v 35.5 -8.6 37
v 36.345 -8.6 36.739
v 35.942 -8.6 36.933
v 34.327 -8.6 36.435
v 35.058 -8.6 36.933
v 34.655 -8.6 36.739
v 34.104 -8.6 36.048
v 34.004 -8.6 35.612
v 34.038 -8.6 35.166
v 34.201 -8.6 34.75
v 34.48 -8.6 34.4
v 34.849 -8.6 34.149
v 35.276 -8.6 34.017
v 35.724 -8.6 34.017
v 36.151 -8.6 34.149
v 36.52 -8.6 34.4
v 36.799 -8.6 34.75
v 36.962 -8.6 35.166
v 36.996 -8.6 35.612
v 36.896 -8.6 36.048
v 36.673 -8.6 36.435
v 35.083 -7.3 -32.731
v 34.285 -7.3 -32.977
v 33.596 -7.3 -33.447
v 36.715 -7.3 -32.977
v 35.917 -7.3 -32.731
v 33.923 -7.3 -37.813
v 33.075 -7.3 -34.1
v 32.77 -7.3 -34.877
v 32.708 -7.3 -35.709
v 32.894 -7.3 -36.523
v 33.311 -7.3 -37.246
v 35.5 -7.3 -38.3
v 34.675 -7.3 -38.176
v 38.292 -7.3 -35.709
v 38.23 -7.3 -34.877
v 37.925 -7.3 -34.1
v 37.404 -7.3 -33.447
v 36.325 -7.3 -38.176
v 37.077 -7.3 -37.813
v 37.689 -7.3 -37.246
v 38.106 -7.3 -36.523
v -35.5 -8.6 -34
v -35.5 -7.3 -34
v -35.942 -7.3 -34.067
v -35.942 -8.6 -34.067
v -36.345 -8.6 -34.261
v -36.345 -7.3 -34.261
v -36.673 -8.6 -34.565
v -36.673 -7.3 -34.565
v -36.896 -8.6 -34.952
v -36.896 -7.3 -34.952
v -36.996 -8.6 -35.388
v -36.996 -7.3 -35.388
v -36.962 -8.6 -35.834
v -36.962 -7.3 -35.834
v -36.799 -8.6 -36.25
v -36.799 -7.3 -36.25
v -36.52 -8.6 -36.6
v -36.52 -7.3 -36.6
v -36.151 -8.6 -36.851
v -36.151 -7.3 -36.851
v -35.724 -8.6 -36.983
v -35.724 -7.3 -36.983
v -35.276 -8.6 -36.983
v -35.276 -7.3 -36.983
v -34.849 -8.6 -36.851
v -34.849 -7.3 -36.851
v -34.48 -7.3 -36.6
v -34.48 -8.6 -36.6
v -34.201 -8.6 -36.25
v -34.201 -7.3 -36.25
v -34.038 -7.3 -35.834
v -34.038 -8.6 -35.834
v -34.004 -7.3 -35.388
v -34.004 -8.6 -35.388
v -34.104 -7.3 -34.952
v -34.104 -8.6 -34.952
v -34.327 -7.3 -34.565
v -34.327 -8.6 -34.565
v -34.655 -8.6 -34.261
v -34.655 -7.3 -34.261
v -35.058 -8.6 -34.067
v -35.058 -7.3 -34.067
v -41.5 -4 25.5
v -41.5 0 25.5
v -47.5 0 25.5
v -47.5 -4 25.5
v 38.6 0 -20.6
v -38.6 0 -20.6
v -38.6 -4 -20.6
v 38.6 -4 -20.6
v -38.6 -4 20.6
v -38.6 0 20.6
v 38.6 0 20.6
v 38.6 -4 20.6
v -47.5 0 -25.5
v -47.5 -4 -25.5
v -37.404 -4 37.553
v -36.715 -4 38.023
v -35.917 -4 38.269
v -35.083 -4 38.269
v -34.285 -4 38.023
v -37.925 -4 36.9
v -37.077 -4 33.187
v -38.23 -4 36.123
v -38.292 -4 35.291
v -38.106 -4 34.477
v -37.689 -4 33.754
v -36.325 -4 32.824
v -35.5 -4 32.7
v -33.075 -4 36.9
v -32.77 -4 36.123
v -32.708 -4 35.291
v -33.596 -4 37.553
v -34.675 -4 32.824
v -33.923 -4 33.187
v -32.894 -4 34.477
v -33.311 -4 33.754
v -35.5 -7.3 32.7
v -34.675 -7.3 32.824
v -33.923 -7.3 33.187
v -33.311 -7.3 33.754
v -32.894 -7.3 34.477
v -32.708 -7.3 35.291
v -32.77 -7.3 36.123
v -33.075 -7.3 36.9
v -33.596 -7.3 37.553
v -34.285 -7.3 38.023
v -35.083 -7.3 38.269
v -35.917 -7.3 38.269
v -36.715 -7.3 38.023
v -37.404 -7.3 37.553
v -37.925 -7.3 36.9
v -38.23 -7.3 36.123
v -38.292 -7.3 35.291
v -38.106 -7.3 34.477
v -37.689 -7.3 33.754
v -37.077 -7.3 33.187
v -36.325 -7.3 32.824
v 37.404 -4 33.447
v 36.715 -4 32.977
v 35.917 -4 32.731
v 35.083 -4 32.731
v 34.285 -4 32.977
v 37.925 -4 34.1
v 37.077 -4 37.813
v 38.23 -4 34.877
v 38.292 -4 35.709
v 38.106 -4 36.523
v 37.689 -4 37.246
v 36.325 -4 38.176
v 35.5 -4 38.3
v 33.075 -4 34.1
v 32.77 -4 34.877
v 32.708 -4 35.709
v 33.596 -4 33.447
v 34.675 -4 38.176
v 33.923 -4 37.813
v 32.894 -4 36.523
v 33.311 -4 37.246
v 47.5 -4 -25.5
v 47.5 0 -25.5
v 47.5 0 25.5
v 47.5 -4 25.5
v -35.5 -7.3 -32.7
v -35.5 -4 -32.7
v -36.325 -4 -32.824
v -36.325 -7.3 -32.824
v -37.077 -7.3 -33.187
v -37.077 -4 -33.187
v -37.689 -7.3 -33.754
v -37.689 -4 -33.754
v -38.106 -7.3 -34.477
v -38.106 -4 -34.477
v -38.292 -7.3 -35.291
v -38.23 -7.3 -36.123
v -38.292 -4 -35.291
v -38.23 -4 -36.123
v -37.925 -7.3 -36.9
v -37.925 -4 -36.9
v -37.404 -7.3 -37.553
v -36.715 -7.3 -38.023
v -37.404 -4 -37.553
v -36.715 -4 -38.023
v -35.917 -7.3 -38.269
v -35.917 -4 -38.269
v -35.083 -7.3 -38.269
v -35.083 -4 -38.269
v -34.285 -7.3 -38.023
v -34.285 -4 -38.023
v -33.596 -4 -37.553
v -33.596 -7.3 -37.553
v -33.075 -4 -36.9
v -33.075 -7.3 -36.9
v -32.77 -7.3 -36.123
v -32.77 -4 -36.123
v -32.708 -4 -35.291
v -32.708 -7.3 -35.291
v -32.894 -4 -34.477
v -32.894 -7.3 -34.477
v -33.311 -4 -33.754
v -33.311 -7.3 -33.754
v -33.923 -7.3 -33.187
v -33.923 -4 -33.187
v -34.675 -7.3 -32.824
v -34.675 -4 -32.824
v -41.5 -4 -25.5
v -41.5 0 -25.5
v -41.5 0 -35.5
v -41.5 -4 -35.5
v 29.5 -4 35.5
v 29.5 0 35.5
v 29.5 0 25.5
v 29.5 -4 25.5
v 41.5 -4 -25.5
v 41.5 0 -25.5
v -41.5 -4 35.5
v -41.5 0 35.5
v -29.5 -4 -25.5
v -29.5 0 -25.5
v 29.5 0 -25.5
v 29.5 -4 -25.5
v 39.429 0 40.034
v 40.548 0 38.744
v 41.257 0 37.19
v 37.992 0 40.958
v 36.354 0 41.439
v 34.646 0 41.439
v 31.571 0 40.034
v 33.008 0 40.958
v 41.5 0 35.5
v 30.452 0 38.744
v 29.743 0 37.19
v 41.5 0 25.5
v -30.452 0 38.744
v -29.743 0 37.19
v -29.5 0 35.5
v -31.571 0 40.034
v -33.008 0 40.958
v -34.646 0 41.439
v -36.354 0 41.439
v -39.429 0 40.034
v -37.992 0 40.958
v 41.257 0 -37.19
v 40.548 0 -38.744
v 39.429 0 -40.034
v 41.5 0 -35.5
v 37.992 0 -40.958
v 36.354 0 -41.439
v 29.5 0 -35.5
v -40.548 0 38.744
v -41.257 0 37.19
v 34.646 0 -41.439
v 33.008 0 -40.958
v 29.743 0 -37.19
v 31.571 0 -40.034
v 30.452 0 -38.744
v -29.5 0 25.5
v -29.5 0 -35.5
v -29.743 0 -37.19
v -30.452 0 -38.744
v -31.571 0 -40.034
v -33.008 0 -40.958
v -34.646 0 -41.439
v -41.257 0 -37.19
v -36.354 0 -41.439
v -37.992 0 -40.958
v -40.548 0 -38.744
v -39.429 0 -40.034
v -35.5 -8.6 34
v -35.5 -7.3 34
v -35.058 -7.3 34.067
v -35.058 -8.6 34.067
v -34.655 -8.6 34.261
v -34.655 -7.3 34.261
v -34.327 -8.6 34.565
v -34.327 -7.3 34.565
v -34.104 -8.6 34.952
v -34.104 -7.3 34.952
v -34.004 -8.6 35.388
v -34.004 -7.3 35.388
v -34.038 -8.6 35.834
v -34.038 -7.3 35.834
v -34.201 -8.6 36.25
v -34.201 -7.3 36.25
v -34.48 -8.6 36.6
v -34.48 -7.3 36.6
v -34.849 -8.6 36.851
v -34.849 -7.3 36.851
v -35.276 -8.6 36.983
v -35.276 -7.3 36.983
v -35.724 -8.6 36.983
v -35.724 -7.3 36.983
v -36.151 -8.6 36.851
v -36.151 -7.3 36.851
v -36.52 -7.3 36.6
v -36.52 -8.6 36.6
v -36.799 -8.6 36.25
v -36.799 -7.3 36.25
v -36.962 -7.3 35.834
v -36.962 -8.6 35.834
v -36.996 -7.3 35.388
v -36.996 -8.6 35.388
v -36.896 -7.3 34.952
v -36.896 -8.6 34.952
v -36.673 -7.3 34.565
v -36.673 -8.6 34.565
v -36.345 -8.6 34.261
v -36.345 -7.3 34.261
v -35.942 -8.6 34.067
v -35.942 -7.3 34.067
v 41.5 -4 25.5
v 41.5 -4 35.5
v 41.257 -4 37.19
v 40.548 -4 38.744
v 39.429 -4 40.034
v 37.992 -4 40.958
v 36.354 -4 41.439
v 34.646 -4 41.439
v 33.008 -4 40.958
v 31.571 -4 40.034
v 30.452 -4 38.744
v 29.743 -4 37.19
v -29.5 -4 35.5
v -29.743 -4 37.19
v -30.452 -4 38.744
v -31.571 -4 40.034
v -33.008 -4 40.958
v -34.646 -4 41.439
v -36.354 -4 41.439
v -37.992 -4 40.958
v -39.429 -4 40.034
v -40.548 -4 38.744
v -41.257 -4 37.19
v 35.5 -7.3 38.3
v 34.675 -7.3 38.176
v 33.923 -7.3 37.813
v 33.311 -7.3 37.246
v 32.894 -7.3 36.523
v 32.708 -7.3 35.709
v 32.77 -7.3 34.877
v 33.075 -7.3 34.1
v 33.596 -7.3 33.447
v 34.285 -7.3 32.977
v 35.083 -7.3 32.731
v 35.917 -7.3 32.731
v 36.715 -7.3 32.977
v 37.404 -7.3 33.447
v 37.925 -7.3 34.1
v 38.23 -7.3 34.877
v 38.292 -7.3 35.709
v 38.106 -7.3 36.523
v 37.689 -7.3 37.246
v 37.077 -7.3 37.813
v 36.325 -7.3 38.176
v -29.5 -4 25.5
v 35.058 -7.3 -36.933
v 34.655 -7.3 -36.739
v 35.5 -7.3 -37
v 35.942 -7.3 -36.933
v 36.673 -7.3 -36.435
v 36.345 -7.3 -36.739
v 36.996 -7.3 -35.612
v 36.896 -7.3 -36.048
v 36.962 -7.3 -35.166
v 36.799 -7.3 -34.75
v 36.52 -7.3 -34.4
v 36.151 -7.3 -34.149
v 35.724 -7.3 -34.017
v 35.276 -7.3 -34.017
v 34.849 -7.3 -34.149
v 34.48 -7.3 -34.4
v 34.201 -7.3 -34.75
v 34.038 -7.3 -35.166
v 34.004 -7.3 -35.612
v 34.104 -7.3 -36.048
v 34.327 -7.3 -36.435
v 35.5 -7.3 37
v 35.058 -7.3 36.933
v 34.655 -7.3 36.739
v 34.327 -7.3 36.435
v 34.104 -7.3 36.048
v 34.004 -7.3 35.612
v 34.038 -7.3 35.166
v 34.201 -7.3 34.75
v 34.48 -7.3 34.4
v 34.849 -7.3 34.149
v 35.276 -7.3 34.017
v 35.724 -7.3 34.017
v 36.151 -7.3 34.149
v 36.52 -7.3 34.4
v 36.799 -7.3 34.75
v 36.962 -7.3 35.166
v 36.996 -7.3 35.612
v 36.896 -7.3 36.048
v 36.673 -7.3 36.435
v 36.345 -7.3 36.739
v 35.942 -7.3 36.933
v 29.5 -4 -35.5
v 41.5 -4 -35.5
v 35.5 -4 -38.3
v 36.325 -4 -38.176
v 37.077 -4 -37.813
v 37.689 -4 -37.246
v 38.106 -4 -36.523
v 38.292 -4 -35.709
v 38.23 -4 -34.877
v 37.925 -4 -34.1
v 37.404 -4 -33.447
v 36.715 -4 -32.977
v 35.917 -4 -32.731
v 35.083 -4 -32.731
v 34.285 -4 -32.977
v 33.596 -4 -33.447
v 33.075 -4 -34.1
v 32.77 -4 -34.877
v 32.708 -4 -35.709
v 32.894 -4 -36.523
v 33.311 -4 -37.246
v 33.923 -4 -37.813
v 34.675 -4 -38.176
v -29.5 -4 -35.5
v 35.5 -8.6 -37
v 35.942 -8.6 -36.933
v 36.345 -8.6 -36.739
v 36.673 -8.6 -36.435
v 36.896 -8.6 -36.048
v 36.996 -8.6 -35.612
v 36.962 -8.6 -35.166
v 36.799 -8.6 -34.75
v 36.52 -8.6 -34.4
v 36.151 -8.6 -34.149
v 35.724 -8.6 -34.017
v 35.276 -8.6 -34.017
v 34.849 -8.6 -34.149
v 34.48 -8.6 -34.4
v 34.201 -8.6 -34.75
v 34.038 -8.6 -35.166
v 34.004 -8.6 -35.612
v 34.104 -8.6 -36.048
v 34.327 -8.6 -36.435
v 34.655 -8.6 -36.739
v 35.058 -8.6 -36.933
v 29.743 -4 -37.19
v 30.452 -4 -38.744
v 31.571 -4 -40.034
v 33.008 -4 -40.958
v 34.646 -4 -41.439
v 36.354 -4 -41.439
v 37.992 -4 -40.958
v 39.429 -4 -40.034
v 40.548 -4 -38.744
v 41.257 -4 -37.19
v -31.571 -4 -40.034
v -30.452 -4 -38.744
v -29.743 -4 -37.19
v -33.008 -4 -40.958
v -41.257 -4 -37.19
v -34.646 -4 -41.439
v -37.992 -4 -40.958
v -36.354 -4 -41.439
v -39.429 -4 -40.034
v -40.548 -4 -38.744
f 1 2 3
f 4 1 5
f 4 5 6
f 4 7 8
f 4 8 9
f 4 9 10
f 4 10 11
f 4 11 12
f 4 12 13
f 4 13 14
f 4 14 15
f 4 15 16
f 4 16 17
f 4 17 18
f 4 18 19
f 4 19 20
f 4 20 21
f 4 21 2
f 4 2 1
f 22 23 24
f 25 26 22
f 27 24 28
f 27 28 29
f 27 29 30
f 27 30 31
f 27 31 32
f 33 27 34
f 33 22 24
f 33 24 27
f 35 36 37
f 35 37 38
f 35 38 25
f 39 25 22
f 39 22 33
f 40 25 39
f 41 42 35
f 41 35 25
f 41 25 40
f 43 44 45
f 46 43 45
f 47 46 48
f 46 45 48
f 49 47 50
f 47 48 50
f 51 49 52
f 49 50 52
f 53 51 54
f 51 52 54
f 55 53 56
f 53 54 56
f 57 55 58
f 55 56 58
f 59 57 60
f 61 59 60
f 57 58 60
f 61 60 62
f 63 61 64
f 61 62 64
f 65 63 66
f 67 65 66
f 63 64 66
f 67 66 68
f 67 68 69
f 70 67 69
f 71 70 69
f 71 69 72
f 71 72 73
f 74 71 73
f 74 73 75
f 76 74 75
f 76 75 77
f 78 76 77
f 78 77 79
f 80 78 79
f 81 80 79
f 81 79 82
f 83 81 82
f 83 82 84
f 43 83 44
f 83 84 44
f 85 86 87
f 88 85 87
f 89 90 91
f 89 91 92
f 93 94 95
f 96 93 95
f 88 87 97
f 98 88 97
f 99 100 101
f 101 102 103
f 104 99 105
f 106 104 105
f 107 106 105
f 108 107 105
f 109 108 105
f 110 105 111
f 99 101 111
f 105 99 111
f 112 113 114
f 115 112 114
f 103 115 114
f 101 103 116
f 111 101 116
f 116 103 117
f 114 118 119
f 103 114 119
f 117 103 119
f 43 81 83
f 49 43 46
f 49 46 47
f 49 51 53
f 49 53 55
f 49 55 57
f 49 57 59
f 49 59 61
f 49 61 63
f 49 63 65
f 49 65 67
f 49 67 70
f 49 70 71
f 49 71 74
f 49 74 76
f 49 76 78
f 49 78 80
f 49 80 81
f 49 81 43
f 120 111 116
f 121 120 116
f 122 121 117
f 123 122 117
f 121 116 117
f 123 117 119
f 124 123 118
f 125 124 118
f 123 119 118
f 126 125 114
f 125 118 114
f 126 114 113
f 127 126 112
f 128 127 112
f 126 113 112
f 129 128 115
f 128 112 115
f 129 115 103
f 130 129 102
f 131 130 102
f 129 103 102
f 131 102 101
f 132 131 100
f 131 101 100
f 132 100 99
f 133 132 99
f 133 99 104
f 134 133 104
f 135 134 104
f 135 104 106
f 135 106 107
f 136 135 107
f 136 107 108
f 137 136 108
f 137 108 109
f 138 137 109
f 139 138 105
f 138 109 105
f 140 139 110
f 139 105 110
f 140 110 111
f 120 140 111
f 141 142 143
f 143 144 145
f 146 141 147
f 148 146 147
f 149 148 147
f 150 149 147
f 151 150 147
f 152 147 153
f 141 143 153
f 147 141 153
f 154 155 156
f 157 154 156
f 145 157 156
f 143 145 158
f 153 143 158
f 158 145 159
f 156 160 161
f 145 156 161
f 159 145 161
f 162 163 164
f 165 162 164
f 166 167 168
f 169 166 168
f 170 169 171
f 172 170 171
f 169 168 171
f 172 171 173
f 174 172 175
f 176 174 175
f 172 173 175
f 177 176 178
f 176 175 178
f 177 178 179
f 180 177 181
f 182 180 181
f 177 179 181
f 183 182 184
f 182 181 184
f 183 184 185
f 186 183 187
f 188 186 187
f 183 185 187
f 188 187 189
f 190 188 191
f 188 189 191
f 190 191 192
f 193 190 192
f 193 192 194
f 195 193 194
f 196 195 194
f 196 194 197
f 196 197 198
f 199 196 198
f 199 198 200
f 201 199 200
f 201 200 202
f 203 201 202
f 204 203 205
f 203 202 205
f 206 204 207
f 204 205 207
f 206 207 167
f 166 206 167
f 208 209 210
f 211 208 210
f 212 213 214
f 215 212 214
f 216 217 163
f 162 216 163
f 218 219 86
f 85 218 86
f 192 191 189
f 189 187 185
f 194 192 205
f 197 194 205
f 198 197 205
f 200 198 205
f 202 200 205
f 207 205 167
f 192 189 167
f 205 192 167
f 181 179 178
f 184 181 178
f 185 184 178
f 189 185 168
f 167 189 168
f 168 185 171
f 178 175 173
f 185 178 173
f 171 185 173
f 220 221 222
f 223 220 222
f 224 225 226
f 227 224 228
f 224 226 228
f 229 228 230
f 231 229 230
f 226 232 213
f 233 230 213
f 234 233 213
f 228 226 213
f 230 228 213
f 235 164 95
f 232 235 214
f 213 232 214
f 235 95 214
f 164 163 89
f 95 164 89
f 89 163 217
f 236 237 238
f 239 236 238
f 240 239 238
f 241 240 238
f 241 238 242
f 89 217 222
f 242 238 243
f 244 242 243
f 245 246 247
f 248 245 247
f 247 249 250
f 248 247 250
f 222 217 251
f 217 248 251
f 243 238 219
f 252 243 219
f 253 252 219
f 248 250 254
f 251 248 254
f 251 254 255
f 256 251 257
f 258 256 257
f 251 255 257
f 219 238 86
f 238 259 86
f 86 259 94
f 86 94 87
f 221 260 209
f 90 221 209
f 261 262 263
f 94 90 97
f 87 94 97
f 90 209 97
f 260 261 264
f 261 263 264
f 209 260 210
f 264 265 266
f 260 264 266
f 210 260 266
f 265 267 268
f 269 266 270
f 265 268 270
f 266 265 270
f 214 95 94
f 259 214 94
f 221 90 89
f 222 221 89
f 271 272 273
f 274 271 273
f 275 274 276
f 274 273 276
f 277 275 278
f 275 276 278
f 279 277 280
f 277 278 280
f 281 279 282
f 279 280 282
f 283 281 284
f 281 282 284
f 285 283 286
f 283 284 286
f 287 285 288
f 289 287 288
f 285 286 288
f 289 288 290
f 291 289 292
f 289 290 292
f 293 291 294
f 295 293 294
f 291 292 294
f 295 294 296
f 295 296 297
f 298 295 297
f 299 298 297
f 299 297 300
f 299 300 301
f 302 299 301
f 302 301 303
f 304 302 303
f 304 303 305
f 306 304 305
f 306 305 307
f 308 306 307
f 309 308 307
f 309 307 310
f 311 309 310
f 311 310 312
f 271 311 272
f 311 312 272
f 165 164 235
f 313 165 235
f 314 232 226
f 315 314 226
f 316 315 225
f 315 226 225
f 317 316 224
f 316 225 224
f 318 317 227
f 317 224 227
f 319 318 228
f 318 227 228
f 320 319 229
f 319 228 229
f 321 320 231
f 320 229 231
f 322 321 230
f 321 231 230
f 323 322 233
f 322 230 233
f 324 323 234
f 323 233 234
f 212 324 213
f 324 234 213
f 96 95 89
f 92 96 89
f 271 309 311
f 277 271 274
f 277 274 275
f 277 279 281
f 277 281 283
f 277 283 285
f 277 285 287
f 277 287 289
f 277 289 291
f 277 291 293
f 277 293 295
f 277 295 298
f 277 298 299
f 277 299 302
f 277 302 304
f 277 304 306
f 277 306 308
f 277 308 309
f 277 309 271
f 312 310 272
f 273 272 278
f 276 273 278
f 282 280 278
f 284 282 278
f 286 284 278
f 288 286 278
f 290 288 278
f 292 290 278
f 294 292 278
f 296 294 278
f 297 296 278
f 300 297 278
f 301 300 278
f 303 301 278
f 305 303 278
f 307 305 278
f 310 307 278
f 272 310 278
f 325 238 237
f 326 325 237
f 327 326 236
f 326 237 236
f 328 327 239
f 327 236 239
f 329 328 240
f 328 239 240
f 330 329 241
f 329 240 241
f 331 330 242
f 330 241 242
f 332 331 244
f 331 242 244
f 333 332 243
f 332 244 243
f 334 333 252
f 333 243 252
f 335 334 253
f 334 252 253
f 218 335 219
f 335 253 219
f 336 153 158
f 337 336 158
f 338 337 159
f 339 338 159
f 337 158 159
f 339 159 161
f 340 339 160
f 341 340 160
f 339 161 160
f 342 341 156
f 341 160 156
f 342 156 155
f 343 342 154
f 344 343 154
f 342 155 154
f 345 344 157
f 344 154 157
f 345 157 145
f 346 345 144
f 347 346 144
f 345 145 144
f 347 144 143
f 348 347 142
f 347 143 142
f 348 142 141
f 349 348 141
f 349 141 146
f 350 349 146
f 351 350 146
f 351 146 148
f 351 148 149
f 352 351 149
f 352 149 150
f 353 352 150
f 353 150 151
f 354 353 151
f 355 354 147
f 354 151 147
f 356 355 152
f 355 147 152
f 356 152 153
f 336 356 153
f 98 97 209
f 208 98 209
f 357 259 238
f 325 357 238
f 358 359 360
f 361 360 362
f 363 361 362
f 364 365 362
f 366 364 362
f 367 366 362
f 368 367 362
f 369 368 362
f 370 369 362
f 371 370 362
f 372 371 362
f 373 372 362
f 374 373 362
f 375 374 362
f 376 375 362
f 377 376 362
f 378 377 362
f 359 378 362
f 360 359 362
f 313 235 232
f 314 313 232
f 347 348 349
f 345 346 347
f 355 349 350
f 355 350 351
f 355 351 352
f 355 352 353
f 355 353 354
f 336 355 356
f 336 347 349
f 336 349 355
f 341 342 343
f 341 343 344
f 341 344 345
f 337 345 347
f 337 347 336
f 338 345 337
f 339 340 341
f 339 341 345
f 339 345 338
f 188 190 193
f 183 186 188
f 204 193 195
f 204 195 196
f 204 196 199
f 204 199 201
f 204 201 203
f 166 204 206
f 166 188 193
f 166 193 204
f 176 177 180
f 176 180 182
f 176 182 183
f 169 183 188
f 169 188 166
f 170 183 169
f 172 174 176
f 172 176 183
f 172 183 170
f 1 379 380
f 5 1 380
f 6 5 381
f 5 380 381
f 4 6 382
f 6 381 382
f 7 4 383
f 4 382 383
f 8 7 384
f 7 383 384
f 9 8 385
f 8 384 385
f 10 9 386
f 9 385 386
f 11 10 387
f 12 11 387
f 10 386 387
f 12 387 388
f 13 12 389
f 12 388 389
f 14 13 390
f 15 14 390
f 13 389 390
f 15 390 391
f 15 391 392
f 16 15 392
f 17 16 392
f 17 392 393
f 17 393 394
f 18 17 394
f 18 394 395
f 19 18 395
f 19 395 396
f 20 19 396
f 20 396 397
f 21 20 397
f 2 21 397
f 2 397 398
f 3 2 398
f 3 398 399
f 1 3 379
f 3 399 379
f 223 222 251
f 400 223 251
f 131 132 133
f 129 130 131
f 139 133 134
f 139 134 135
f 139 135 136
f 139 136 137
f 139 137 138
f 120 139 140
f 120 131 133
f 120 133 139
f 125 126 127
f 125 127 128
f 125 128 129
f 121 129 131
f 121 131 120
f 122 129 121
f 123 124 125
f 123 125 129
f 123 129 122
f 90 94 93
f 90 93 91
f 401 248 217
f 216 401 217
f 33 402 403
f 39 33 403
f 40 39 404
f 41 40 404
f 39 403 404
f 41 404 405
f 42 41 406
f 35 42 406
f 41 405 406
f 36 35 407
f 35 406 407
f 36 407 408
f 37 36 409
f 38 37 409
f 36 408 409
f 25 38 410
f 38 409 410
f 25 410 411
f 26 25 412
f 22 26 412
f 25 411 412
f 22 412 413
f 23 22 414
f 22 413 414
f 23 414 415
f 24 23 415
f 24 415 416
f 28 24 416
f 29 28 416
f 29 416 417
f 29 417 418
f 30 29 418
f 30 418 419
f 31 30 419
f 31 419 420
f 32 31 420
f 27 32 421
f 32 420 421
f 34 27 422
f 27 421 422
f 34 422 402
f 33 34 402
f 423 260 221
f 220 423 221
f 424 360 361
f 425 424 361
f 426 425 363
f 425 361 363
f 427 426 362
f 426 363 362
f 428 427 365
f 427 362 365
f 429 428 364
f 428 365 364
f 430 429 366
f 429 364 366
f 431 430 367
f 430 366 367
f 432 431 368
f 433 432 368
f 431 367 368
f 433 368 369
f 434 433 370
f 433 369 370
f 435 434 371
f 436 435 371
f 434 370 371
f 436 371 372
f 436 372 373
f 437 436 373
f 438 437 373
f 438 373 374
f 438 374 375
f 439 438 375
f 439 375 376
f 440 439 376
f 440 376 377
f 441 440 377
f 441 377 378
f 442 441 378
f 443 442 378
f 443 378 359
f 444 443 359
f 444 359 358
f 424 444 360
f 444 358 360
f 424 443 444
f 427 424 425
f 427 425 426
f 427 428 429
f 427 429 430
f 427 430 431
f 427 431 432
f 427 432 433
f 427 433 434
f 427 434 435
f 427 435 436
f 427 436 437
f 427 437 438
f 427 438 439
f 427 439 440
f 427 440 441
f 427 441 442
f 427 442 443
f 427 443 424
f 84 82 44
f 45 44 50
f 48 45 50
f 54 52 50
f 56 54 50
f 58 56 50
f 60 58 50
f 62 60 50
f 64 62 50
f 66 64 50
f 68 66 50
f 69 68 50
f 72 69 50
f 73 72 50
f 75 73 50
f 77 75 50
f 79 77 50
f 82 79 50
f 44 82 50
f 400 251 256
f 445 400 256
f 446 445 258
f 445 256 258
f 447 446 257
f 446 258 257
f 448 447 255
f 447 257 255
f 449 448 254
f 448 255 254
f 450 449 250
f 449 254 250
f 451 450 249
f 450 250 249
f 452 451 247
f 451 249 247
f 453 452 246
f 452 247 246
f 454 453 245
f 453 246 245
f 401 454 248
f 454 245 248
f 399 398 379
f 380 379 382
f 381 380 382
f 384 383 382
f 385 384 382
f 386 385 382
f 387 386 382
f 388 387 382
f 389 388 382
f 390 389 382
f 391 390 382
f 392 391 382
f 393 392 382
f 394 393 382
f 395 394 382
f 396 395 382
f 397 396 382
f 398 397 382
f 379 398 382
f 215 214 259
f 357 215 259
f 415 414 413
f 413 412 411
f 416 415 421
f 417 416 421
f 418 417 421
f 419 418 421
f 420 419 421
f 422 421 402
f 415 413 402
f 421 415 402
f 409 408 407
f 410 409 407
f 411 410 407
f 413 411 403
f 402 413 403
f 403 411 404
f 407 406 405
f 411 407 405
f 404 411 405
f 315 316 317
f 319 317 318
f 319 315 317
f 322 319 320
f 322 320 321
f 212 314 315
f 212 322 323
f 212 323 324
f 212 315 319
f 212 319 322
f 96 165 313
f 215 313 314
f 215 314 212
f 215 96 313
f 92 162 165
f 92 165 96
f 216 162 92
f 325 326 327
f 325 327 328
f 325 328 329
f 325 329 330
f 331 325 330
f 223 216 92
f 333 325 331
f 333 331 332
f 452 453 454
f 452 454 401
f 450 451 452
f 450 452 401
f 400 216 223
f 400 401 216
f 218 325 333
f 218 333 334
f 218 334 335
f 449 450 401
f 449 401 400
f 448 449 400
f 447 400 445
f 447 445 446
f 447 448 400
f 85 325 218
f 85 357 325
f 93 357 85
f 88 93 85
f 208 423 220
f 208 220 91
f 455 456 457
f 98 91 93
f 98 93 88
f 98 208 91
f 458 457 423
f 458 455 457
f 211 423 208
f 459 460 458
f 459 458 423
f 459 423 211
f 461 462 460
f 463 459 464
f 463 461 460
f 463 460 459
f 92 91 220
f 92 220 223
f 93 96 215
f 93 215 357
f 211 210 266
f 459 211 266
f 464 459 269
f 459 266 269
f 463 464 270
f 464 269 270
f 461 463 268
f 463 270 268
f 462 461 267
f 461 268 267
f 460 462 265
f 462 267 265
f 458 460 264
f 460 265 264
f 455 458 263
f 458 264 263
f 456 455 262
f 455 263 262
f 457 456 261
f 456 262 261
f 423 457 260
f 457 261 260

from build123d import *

# Parameters (mm, degrees)
EXTRUDE_1_DEPTH     = 4
SKETCH_4_R          = 2.8
EXTRUDE_2_DEPTH     = 3.3
EXTRUDE_2_2_DEPTH   = 3.3
EXTRUDE_2_3_DEPTH   = 3.3
EXTRUDE_2_4_DEPTH   = 3.3
SKETCH_5_R          = 1.5
EXTRUDE_3_DEPTH     = 1.3
EXTRUDE_3_2_DEPTH   = 1.3
EXTRUDE_3_3_DEPTH   = 1.3
EXTRUDE_3_4_DEPTH   = 1.3
SKETCH_10_W         = 77.2
SKETCH_10_H         = 41.2
CUT_EXTRUDE_5_DEPTH = 64.658934958


with BuildPart() as part:
    # 草图1 → 凸台-拉伸1 (new body)
    with BuildSketch(Plane(origin=(0, 0, 0), x_dir=(1, 0, 0), z_dir=(0, 1, 0))):
        with BuildLine():
            Line((-47.5, 25.5), (-41.5, 25.5))
            Line((-41.5, 25.5), (-41.5, 35.5))
            ThreePointArc((-41.5, 35.5), (-35.5, 41.5), (-29.5, 35.5))
            Line((-29.5, 35.5), (-29.5, 25.5))
            Line((-29.5, 25.5), (-3, 25.5))
            Line((-3, 25.5), (3, 25.5))
            Line((3, 25.5), (29.5, 25.5))
            Line((29.5, 25.5), (29.5, 35.5))
            ThreePointArc((29.5, 35.5), (35.5, 41.5), (41.5, 35.5))
            Line((41.5, 35.5), (41.5, 25.5))
            Line((41.5, 25.5), (47.5, 25.5))
            Line((47.5, 25.5), (47.5, -25.5))
            Line((47.5, -25.5), (41.5, -25.5))
            Line((41.5, -25.5), (41.5, -35.5))
            ThreePointArc((41.5, -35.5), (35.5, -41.5), (29.5, -35.5))
            Line((29.5, -35.5), (29.5, -25.5))
            Line((29.5, -25.5), (3, -25.5))
            Line((3, -25.5), (-3, -25.5))
            Line((-3, -25.5), (-29.5, -25.5))
            Line((-29.5, -25.5), (-29.5, -35.5))
            ThreePointArc((-29.5, -35.5), (-35.5, -41.5), (-41.5, -35.5))
            Line((-41.5, -35.5), (-41.5, -25.5))
            Line((-41.5, -25.5), (-47.5, -25.5))
            Line((-47.5, -25.5), (-47.5, 25.5))
        make_face()
    extrude(amount=-EXTRUDE_1_DEPTH)

    # 草图10 → 切除-拉伸5 (cut, through all)
    with BuildSketch(Plane(origin=(0, 0, 0), x_dir=(1, 0, 0), z_dir=(0, 1, 0))):
        Rectangle(SKETCH_10_W, SKETCH_10_H)
    extrude(amount=-CUT_EXTRUDE_5_DEPTH, mode=Mode.SUBTRACT)


with BuildPart() as body_2:
    # 草图4 → 凸台-拉伸2 (new body)
    with BuildSketch(Plane.XZ.offset(4)):
        with Locations(Location((35.5, 35.5, 0), (0, 0, 90))):
            Circle(SKETCH_4_R)
    extrude(amount=EXTRUDE_2_DEPTH)


with BuildPart() as body_3:
    # 草图4 → Extrude 2 2 (new body)
    with BuildSketch(Plane.XZ.offset(4)):
        with Locations(Location((35.5, -35.5, 0), (0, 0, 270))):
            Circle(SKETCH_4_R)
    extrude(amount=EXTRUDE_2_2_DEPTH)


with BuildPart() as body_4:
    # 草图4 → Extrude 2 3 (new body)
    with BuildSketch(Plane.XZ.offset(4)):
        with Locations(Location((-35.5, -35.5, 0), (0, 0, 90))):
            Circle(SKETCH_4_R)
    extrude(amount=EXTRUDE_2_3_DEPTH)


with BuildPart() as body_5:
    # 草图4 → Extrude 2 4 (new body)
    with BuildSketch(Plane.XZ.offset(4)):
        with Locations(Location((-35.5, 35.5, 0), (0, 0, 270))):
            Circle(SKETCH_4_R)
    extrude(amount=EXTRUDE_2_4_DEPTH)


with BuildPart() as body_6:
    # 草图5 → 凸台-拉伸3 (new body)
    with BuildSketch(Plane.XZ.offset(7.3)):
        with Locations(Location((-35.5, 35.5, 0), (0, 0, 270))):
            Circle(SKETCH_5_R)
    extrude(amount=EXTRUDE_3_DEPTH)


with BuildPart() as body_7:
    # 草图5 → Extrude 3 2 (new body)
    with BuildSketch(Plane.XZ.offset(7.3)):
        with Locations(Location((35.5, 35.5, 0), (0, 0, 90))):
            Circle(SKETCH_5_R)
    extrude(amount=EXTRUDE_3_2_DEPTH)


with BuildPart() as body_8:
    # 草图5 → Extrude 3 3 (new body)
    with BuildSketch(Plane.XZ.offset(7.3)):
        with Locations(Location((35.5, -35.5, 0), (0, 0, 270))):
            Circle(SKETCH_5_R)
    extrude(amount=EXTRUDE_3_3_DEPTH)


with BuildPart() as body_9:
    # 草图5 → Extrude 3 4 (new body)
    with BuildSketch(Plane.XZ.offset(7.3)):
        with Locations(Location((-35.5, -35.5, 0), (0, 0, 90))):
            Circle(SKETCH_5_R)
    extrude(amount=EXTRUDE_3_4_DEPTH)


solid = Compound([part.part, body_2.part, body_3.part, body_4.part, body_5.part, body_6.part, body_7.part, body_8.part, body_9.part])
